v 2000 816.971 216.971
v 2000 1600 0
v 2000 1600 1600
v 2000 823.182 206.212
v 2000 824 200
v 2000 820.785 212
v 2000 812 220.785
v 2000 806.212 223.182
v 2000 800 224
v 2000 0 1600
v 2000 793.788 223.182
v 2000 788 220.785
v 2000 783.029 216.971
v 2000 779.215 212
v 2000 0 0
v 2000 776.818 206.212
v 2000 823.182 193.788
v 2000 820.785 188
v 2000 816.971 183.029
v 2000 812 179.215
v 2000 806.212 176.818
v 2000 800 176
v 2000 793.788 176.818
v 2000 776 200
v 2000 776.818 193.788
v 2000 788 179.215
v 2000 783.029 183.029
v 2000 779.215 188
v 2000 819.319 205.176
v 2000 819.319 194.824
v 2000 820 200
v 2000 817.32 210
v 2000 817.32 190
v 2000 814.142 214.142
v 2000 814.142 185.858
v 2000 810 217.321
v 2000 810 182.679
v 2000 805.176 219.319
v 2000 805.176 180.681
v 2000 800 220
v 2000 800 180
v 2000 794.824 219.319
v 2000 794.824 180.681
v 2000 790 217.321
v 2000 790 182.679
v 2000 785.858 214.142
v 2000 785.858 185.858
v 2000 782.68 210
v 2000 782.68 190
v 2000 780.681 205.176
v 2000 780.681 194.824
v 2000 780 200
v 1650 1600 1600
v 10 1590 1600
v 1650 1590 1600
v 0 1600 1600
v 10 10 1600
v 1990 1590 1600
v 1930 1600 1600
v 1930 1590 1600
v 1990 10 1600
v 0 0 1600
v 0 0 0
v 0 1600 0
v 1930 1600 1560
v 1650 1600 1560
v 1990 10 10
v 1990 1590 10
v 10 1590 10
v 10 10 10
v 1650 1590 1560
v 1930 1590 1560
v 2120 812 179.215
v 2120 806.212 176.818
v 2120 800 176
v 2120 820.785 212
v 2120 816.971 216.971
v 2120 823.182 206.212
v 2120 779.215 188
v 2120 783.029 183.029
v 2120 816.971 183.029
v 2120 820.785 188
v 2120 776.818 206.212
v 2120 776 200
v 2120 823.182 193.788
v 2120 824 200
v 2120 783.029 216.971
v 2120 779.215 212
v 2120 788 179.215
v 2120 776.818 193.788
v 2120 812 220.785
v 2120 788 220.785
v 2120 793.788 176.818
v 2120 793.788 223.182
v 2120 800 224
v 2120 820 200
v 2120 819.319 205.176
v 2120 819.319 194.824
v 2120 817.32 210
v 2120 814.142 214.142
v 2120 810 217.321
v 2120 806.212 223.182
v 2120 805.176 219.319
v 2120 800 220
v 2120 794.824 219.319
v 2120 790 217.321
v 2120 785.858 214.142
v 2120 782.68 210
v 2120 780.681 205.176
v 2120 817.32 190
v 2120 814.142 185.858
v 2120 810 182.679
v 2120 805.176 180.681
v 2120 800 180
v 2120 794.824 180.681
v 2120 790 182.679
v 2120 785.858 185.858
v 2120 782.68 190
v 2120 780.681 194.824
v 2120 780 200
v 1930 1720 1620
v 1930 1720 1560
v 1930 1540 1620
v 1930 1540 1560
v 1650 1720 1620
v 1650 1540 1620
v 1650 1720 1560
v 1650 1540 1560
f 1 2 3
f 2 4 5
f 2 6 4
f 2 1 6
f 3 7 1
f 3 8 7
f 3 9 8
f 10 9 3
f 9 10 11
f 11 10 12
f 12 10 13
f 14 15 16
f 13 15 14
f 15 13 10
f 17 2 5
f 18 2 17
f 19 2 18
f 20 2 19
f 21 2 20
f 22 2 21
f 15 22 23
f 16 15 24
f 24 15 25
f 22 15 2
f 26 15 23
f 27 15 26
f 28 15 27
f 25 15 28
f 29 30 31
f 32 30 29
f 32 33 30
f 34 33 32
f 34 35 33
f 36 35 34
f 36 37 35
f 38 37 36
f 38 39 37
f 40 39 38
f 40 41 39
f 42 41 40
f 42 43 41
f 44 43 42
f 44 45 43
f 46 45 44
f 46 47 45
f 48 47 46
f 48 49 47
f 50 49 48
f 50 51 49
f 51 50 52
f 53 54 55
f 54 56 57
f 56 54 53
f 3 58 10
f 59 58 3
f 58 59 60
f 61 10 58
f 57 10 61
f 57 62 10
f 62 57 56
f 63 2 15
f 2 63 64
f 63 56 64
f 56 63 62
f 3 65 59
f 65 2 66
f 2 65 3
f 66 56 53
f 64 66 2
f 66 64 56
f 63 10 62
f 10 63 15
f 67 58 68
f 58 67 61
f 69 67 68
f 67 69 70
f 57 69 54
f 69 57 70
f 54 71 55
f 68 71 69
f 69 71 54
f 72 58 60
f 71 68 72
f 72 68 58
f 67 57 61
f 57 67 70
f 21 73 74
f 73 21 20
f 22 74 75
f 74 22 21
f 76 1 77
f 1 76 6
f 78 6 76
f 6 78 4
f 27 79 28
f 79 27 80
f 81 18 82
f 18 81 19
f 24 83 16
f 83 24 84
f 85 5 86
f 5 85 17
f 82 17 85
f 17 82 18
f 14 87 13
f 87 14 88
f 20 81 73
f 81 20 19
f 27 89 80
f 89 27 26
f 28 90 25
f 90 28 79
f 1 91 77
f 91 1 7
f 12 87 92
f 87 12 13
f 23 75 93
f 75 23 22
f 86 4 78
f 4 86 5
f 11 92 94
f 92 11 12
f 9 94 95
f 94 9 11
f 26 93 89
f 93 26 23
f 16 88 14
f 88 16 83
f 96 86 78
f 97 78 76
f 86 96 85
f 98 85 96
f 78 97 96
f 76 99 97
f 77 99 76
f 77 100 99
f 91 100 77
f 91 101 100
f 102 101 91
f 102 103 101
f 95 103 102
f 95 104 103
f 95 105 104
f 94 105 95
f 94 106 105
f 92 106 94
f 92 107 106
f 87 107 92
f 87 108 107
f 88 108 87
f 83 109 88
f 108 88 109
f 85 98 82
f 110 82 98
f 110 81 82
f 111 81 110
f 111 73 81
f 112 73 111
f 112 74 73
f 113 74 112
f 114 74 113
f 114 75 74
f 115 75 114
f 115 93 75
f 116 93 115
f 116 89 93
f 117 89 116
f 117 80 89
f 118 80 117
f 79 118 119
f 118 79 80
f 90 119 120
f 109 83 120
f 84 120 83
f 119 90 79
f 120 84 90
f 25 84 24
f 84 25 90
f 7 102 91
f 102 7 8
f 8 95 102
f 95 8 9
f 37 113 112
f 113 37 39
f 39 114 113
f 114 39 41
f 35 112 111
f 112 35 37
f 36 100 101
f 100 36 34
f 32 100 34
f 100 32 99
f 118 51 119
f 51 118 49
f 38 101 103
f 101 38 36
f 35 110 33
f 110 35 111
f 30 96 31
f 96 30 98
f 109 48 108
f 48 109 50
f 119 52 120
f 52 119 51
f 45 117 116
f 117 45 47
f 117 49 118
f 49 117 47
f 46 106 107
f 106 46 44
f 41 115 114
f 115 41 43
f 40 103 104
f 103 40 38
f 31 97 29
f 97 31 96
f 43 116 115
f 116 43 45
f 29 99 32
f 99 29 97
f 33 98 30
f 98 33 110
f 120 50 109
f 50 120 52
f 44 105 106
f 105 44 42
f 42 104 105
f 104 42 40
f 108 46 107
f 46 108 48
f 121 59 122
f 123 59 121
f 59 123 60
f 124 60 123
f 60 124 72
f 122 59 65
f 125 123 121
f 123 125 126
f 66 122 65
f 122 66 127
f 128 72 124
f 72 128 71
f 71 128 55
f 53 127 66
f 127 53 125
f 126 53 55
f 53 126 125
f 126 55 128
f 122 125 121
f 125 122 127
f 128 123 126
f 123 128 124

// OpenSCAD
// file: ../params.scad
// Shared millimetre parameters. Keep in lockstep with freecad/params.py.
// Module scale: 150 kg/day wet train. Walls are CPVC sheet, not metal.

$fn = 36;

WALL        = 12;     // CPVC sheet thickness
FLOOR       = 16;     // floor plate (trough sits on this)

// LEACH CSTR 1 — inside liquor box
CSTR_L      = 2000;
CSTR_W      = 1200;
CSTR_H      = 1400;   // liquid + freeboard
FREEBOARD   = 200;

// CSTR 2 weir (same vessel, +X wall)
WEIR_W      = 450;
WEIR_CREST  = CSTR_H - FREEBOARD;   // from inner floor
WEIR_SLOT_H = 80;
WEIR_LIP    = 120;    // external spout projection

// CSTR 3 floor auger — injection-molded PVC / FG
AUGER_D     = 140;    // flight OD
AUGER_SHAFT = 40;
AUGER_PITCH = 110;
AUGER_TROUGH_W = 180;
AUGER_TROUGH_H = 110;
AUGER_OFFSET_Y = 280; // trough centreline from inner -Y wall
AUGER_INCLINE  = 28;  // deg, lifts out of liquor toward +X

// mixer / nozzles (lid)
MIXER_D     = 50;
GAS_D       = 80;     // acid-gas takeoff
DROP_X      = 80;     // inner-X of shred drop slot
DROP_L      = 400;
DROP_W      = 250;
DROP_COAM   = 80;     // raised coaming around the slot

// LEACHATE PUMP / coarse strainer — −X wall, opposite the weir
PUMP_D      = 80;     // DN80
PUMP_Z      = 450;    // centreline above inner floor (submerged)
PUMP_Y      = 900;    // centreline from inner −Y (away from auger)
STRAINER_L  = 180;
STRAINER_W  = 140;
STRAINER_H  = 160;

// mezzanine feed train
MEZZ_H      = 2200;   // platform top above tank outer floor
MEZZ_L      = 1600;   // platform length in −X
MEZZ_THK    = 12;
HOPPER_L    = 700;
HOPPER_W    = 600;
HOPPER_H    = 800;
SHRED_L     = 500;
SHRED_W     = 500;
SHRED_H     = 450;
CONV_W      = 240;
CONV_H      = 120;
CONV_PLATE  = 6;      // trough plate
CONV_FLANGE = 40;
CONV_SPRING_D = 50;
CONV_SPRING_H = 80;
CONV_BOLT   = 10;     // M10 clearance
CONV_LEN    = 1800;   // default standalone length; plant instance is computed
DUST_D      = 150;    // dust-hood outlet to DUST header
AUGER_LIFT_L = 700;

// dewater belts + split (Phase A 4–6)
FDEW_L      = 1800;
FDEW_W      = 450;
FDEW_H      = 80;
FDEW_RISE   = 120;    // solids end higher so liquor runs back to weir
SDEW_L      = 1400;
SDEW_W      = 220;
SDEW_H      = 80;
SPLIT_L     = 600;
SPLIT_W     = 500;
SPLIT_H     = 400;
STUB_L      = 400;
STUB_W      = 300;
STUB_H      = 250;

// EW funnel cell
EW_L        = 600;    // along aisle (overflow direction)
EW_W        = 420;    // anode-cathode depth
EW_H        = 650;    // rectangular body
EW_FUNNEL_H = 220;
EW_VALVE_D  = 50;
EW_VALVE_L  = 60;
EW_MEM_T    = 4;      // CEM
EW_SLOT     = 10;     // membrane cassette slot
EW_PITCH    = 750;    // aisle spacing, centre to centre
AISLE_X0    = 200;
AISLE_Y     = -(EW_W + 2*WALL) - 400;
AISLE_Z     = 400;
BUND_H      = 150;
BUND_PAD    = 250;
SUMP_L      = 400;
SUMP_W      = 400;
SUMP_H      = 300;
VDF_D       = 700;
VDF_L       = 900;
PAIL_W      = 180;
HDR_D       = 80;
HDR_Z       = 1400;
PYRO_D      = 320;
PYRO_L      = 2800;

// Campus envelopes — lockstep with freecad/params.py
FARM_X=12000; FARM_Y=8000; FARM_L=12000; FARM_W=8000; FARM_H=4500;
FAB_X=12000;  FAB_Y=-6000; FAB_L=8000;   FAB_W=6000;  FAB_H=4000;
HAB_X=-8000;  HAB_Y=8000;  HAB_L=8000;   HAB_W=6000;  HAB_H=3200;
CRYO_X=-6000; CRYO_Y=-4000; CRYO_L=4000; CRYO_W=3000; CRYO_H=3000;
MFG_X=2000;   MFG_Y=9000;  MFG_L=6000;   MFG_W=4000;  MFG_H=3500;

LIFE_Z_GREY=900; LIFE_Z_UPW=1100; LIFE_Z_ETCH=1300;
LIFE_Z_O2=2800; LIFE_Z_N2=3000; LIFE_Z_CO2=3200;
LIFE_D_GREY=50; LIFE_D_UPW=40; LIFE_D_ETCH=32;
LIFE_D_GAS=25; LIFE_D_CO2=40;
// main file
// HAB WASTE — J1 liquor. J2 is a chute.
include <../params.scad>;
$fn = 24;
L=2000; W=1600; H=1600; T=10;

module stub(d, l=120) {
    difference() {
        cylinder(h=l, d=d+8);
        translate([0,0,-1]) cylinder(h=l+2, d=d);
    }
}

module mfg_hab_waste() {
    difference() {
        cube([L, W, H]);
        translate([T, T, T]) cube([L-2*T, W-2*T, H]);
    }
    translate([L, W/2, 200]) rotate([0,90,0]) stub(40); // J1
    translate([L-350, W-60, H-40]) cube([280, 180, 60]); // J2 lip
}

mfg_hab_waste();
